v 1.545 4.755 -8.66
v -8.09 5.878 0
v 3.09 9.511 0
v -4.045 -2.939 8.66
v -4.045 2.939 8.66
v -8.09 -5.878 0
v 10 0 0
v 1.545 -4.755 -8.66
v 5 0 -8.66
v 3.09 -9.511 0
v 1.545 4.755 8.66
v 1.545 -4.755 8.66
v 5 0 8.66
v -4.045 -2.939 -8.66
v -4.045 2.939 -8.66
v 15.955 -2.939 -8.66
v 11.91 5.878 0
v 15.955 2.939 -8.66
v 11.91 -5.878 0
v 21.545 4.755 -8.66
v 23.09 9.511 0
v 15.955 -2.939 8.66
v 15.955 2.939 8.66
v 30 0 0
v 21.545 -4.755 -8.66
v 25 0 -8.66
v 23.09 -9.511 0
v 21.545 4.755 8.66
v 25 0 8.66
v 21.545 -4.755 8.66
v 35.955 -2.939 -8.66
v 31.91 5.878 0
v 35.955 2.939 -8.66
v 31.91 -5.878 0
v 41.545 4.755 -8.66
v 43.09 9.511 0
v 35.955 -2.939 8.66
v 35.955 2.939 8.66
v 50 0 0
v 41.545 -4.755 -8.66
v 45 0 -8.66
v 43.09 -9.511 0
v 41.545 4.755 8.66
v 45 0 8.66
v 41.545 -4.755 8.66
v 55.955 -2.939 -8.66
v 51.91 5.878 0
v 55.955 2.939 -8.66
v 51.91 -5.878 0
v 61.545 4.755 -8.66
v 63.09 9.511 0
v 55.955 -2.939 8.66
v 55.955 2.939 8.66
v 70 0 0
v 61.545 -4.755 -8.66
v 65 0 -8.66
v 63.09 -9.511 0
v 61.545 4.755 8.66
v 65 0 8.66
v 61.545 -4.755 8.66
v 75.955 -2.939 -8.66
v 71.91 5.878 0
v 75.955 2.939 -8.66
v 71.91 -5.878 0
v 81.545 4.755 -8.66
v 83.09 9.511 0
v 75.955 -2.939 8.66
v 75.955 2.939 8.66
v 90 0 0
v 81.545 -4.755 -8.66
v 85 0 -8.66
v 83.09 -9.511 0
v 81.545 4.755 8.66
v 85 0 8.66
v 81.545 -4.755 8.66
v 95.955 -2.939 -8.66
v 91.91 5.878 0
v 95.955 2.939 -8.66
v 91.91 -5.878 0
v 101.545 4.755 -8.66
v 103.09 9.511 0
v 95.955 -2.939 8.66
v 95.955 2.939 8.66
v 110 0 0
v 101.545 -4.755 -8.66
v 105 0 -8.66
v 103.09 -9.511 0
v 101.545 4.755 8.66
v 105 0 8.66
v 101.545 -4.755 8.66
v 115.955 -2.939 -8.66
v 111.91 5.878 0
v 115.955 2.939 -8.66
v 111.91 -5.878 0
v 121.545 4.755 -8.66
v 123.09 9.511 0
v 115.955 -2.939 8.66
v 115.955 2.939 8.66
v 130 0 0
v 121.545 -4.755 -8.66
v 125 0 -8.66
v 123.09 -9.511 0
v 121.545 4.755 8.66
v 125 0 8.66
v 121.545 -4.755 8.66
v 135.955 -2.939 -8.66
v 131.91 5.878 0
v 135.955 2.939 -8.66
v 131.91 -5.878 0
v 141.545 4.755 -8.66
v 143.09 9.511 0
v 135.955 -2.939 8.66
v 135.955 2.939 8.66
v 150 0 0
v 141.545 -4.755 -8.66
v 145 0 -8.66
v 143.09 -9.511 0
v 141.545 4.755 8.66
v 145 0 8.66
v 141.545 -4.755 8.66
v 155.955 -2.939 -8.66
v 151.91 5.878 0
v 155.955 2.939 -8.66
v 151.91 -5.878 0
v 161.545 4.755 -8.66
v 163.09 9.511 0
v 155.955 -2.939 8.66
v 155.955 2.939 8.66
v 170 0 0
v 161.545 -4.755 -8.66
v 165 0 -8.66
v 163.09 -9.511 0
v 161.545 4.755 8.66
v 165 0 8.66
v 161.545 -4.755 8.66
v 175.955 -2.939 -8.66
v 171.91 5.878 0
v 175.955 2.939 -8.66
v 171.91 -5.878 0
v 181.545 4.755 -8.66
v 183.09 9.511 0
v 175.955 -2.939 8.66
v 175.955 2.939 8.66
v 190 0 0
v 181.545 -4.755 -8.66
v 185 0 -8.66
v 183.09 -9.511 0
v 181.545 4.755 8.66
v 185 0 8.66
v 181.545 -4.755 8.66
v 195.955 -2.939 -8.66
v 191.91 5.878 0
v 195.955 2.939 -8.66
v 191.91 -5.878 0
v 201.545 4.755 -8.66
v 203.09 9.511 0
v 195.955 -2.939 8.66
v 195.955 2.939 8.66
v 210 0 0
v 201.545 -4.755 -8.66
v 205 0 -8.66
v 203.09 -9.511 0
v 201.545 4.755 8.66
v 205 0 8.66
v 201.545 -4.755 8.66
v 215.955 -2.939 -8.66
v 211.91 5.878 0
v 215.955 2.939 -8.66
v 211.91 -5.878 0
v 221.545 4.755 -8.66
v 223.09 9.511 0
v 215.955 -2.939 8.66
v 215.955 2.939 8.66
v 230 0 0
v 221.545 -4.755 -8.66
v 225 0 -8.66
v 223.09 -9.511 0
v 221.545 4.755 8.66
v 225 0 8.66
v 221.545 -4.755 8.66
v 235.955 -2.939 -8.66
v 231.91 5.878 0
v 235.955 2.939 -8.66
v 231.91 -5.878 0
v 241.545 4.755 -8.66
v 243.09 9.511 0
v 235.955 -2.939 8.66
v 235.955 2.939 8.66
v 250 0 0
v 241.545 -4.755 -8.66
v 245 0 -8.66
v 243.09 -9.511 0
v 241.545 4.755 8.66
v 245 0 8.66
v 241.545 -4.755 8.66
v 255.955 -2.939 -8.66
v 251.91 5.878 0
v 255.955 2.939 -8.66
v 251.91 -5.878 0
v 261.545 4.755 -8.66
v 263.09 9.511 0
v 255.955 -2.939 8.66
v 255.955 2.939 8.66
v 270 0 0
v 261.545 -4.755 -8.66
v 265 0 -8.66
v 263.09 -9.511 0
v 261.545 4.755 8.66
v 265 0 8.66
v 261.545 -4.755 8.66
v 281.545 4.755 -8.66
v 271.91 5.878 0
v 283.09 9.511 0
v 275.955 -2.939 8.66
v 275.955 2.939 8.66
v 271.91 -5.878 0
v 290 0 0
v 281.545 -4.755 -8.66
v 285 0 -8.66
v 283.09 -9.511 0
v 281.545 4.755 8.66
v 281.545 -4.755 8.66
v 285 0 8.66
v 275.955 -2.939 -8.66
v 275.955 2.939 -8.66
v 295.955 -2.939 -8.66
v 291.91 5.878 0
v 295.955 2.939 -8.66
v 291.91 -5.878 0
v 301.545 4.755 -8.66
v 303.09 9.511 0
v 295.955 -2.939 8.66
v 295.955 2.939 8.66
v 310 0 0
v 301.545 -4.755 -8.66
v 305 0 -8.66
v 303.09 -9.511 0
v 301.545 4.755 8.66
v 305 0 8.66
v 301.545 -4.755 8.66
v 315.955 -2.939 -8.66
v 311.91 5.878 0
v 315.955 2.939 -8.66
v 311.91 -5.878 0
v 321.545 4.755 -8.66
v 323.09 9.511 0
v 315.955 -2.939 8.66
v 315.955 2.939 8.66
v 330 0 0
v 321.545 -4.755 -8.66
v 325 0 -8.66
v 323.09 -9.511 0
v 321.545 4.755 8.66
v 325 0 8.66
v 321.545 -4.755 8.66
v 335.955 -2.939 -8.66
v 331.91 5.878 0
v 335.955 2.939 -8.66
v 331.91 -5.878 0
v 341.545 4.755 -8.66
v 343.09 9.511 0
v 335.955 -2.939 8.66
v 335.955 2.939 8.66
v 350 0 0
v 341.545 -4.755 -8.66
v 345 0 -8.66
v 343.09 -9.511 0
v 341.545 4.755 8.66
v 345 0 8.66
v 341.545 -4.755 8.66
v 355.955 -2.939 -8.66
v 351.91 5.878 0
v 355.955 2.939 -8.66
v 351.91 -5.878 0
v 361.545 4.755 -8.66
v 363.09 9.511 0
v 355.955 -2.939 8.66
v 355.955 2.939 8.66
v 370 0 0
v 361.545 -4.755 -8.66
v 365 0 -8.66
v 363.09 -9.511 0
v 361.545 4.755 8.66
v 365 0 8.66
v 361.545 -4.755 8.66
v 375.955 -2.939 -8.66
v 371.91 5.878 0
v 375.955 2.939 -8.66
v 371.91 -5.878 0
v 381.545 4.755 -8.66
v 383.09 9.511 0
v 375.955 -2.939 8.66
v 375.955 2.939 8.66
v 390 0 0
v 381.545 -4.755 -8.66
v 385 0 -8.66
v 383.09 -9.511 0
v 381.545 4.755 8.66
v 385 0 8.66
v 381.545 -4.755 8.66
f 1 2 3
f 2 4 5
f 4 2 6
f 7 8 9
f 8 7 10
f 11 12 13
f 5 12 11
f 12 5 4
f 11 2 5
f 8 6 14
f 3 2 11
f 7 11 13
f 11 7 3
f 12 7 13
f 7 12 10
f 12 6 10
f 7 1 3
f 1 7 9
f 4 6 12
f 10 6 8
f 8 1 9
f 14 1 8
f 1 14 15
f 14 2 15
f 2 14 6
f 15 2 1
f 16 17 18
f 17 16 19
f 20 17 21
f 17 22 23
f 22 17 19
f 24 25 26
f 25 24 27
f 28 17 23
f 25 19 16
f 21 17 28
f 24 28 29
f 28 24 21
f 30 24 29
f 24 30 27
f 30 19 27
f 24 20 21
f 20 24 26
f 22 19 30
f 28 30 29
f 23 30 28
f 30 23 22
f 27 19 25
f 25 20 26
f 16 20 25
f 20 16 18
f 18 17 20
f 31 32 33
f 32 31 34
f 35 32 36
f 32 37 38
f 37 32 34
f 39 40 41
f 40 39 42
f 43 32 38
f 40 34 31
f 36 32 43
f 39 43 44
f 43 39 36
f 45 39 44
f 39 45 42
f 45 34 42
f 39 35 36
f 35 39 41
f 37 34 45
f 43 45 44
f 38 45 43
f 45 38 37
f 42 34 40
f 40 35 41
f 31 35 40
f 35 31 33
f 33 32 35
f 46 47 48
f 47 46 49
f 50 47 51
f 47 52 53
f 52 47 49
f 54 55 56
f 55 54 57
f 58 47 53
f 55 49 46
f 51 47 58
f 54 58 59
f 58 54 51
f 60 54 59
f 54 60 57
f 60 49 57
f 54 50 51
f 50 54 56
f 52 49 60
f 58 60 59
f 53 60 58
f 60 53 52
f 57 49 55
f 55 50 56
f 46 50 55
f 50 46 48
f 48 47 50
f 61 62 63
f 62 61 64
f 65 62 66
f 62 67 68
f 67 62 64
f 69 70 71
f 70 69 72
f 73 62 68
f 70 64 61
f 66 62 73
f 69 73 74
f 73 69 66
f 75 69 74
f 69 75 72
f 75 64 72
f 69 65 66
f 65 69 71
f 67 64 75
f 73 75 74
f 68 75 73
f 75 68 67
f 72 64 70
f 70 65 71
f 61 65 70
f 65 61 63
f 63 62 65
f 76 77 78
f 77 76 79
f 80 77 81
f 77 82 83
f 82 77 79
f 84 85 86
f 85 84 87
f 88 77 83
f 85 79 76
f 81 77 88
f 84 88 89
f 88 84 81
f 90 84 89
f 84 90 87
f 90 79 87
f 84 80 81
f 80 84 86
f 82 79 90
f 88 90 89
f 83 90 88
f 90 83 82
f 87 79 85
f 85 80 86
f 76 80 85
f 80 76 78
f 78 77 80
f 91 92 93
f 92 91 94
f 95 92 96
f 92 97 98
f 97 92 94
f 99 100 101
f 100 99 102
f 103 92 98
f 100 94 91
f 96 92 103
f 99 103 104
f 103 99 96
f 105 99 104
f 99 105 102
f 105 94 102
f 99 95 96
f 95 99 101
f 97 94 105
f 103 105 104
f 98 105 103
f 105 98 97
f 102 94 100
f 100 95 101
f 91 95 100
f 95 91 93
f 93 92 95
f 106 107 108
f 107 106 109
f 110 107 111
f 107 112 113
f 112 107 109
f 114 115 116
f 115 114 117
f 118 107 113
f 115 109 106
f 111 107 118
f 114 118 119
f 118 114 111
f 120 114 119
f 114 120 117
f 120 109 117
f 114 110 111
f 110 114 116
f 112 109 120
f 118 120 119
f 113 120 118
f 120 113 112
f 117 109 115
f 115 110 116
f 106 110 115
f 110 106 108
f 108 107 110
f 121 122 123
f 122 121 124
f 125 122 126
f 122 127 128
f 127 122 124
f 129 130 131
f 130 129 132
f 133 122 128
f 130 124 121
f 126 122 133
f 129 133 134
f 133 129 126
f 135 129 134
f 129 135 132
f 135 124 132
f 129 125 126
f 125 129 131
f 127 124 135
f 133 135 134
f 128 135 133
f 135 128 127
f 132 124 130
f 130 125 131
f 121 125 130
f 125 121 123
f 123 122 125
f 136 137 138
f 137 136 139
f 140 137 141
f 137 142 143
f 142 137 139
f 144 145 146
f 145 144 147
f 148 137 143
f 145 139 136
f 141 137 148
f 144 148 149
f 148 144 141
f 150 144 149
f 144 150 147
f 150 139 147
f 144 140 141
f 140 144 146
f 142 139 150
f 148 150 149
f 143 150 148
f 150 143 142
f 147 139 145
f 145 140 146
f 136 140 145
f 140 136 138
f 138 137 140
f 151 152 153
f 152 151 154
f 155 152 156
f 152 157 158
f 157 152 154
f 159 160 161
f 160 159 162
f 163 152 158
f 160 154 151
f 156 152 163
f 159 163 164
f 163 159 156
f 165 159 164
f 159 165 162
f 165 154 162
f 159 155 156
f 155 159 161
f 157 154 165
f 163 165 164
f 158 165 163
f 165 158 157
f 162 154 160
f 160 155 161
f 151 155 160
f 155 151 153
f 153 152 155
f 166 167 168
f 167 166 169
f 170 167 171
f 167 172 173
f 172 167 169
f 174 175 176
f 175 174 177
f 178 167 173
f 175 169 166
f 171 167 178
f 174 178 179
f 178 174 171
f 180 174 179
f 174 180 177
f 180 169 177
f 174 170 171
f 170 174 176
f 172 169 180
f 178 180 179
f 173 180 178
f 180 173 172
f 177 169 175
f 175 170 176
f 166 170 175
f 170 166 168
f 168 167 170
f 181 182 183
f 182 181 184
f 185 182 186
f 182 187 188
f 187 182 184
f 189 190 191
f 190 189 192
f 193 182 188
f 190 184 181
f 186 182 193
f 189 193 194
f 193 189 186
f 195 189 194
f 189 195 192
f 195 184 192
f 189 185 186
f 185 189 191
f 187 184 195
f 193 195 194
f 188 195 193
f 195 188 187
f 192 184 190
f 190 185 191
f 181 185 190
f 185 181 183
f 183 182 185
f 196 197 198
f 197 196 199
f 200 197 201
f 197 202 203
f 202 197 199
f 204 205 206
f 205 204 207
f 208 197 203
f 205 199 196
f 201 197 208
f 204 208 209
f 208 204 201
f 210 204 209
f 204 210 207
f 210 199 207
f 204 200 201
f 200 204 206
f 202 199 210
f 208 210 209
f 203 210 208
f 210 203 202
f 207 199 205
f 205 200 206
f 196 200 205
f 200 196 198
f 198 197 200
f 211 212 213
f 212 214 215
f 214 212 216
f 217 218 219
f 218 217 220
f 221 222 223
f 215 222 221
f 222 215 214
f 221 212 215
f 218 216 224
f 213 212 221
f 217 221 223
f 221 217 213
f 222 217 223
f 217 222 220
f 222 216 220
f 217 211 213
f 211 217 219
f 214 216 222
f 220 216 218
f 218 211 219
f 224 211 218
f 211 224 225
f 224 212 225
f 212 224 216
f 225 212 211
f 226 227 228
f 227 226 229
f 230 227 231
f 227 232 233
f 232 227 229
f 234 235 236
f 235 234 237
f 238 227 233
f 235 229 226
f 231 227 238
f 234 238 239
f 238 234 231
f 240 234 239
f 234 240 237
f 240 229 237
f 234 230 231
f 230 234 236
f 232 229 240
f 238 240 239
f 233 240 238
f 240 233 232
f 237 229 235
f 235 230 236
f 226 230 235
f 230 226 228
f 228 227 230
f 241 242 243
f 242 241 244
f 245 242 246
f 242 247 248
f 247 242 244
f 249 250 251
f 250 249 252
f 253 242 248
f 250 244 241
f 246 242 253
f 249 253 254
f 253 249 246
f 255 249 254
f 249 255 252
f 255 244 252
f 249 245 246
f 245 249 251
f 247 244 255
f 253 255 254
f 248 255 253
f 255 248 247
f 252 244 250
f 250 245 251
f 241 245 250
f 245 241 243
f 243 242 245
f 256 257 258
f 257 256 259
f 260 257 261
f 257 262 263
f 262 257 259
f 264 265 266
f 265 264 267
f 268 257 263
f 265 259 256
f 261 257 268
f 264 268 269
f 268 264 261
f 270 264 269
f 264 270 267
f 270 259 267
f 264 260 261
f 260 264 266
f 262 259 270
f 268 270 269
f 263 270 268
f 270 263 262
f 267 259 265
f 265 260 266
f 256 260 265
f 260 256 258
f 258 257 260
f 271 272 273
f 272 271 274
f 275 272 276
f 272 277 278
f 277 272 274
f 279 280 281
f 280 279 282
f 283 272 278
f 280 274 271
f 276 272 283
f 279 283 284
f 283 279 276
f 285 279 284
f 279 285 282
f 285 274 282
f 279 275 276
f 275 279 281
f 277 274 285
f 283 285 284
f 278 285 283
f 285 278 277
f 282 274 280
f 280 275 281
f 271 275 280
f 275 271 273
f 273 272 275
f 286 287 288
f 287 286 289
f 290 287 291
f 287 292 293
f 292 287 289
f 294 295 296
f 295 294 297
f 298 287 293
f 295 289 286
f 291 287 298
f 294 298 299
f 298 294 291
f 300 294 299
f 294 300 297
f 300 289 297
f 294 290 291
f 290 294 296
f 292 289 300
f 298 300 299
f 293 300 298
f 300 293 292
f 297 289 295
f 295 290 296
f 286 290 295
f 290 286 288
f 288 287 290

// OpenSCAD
N = 20;
//1: 0
//2: 1
//3: 2
//4: 4
//5: 7
//6: 8
//7: 10
//8: 12
//9: 16
//10: 18s

//20: 46

for (i = [0:N-1]) {
translate([i*10*2, 0, 0])
  sphere(r=10, $fn=5);
  //cube([20, 20, 20], center = true);
}
